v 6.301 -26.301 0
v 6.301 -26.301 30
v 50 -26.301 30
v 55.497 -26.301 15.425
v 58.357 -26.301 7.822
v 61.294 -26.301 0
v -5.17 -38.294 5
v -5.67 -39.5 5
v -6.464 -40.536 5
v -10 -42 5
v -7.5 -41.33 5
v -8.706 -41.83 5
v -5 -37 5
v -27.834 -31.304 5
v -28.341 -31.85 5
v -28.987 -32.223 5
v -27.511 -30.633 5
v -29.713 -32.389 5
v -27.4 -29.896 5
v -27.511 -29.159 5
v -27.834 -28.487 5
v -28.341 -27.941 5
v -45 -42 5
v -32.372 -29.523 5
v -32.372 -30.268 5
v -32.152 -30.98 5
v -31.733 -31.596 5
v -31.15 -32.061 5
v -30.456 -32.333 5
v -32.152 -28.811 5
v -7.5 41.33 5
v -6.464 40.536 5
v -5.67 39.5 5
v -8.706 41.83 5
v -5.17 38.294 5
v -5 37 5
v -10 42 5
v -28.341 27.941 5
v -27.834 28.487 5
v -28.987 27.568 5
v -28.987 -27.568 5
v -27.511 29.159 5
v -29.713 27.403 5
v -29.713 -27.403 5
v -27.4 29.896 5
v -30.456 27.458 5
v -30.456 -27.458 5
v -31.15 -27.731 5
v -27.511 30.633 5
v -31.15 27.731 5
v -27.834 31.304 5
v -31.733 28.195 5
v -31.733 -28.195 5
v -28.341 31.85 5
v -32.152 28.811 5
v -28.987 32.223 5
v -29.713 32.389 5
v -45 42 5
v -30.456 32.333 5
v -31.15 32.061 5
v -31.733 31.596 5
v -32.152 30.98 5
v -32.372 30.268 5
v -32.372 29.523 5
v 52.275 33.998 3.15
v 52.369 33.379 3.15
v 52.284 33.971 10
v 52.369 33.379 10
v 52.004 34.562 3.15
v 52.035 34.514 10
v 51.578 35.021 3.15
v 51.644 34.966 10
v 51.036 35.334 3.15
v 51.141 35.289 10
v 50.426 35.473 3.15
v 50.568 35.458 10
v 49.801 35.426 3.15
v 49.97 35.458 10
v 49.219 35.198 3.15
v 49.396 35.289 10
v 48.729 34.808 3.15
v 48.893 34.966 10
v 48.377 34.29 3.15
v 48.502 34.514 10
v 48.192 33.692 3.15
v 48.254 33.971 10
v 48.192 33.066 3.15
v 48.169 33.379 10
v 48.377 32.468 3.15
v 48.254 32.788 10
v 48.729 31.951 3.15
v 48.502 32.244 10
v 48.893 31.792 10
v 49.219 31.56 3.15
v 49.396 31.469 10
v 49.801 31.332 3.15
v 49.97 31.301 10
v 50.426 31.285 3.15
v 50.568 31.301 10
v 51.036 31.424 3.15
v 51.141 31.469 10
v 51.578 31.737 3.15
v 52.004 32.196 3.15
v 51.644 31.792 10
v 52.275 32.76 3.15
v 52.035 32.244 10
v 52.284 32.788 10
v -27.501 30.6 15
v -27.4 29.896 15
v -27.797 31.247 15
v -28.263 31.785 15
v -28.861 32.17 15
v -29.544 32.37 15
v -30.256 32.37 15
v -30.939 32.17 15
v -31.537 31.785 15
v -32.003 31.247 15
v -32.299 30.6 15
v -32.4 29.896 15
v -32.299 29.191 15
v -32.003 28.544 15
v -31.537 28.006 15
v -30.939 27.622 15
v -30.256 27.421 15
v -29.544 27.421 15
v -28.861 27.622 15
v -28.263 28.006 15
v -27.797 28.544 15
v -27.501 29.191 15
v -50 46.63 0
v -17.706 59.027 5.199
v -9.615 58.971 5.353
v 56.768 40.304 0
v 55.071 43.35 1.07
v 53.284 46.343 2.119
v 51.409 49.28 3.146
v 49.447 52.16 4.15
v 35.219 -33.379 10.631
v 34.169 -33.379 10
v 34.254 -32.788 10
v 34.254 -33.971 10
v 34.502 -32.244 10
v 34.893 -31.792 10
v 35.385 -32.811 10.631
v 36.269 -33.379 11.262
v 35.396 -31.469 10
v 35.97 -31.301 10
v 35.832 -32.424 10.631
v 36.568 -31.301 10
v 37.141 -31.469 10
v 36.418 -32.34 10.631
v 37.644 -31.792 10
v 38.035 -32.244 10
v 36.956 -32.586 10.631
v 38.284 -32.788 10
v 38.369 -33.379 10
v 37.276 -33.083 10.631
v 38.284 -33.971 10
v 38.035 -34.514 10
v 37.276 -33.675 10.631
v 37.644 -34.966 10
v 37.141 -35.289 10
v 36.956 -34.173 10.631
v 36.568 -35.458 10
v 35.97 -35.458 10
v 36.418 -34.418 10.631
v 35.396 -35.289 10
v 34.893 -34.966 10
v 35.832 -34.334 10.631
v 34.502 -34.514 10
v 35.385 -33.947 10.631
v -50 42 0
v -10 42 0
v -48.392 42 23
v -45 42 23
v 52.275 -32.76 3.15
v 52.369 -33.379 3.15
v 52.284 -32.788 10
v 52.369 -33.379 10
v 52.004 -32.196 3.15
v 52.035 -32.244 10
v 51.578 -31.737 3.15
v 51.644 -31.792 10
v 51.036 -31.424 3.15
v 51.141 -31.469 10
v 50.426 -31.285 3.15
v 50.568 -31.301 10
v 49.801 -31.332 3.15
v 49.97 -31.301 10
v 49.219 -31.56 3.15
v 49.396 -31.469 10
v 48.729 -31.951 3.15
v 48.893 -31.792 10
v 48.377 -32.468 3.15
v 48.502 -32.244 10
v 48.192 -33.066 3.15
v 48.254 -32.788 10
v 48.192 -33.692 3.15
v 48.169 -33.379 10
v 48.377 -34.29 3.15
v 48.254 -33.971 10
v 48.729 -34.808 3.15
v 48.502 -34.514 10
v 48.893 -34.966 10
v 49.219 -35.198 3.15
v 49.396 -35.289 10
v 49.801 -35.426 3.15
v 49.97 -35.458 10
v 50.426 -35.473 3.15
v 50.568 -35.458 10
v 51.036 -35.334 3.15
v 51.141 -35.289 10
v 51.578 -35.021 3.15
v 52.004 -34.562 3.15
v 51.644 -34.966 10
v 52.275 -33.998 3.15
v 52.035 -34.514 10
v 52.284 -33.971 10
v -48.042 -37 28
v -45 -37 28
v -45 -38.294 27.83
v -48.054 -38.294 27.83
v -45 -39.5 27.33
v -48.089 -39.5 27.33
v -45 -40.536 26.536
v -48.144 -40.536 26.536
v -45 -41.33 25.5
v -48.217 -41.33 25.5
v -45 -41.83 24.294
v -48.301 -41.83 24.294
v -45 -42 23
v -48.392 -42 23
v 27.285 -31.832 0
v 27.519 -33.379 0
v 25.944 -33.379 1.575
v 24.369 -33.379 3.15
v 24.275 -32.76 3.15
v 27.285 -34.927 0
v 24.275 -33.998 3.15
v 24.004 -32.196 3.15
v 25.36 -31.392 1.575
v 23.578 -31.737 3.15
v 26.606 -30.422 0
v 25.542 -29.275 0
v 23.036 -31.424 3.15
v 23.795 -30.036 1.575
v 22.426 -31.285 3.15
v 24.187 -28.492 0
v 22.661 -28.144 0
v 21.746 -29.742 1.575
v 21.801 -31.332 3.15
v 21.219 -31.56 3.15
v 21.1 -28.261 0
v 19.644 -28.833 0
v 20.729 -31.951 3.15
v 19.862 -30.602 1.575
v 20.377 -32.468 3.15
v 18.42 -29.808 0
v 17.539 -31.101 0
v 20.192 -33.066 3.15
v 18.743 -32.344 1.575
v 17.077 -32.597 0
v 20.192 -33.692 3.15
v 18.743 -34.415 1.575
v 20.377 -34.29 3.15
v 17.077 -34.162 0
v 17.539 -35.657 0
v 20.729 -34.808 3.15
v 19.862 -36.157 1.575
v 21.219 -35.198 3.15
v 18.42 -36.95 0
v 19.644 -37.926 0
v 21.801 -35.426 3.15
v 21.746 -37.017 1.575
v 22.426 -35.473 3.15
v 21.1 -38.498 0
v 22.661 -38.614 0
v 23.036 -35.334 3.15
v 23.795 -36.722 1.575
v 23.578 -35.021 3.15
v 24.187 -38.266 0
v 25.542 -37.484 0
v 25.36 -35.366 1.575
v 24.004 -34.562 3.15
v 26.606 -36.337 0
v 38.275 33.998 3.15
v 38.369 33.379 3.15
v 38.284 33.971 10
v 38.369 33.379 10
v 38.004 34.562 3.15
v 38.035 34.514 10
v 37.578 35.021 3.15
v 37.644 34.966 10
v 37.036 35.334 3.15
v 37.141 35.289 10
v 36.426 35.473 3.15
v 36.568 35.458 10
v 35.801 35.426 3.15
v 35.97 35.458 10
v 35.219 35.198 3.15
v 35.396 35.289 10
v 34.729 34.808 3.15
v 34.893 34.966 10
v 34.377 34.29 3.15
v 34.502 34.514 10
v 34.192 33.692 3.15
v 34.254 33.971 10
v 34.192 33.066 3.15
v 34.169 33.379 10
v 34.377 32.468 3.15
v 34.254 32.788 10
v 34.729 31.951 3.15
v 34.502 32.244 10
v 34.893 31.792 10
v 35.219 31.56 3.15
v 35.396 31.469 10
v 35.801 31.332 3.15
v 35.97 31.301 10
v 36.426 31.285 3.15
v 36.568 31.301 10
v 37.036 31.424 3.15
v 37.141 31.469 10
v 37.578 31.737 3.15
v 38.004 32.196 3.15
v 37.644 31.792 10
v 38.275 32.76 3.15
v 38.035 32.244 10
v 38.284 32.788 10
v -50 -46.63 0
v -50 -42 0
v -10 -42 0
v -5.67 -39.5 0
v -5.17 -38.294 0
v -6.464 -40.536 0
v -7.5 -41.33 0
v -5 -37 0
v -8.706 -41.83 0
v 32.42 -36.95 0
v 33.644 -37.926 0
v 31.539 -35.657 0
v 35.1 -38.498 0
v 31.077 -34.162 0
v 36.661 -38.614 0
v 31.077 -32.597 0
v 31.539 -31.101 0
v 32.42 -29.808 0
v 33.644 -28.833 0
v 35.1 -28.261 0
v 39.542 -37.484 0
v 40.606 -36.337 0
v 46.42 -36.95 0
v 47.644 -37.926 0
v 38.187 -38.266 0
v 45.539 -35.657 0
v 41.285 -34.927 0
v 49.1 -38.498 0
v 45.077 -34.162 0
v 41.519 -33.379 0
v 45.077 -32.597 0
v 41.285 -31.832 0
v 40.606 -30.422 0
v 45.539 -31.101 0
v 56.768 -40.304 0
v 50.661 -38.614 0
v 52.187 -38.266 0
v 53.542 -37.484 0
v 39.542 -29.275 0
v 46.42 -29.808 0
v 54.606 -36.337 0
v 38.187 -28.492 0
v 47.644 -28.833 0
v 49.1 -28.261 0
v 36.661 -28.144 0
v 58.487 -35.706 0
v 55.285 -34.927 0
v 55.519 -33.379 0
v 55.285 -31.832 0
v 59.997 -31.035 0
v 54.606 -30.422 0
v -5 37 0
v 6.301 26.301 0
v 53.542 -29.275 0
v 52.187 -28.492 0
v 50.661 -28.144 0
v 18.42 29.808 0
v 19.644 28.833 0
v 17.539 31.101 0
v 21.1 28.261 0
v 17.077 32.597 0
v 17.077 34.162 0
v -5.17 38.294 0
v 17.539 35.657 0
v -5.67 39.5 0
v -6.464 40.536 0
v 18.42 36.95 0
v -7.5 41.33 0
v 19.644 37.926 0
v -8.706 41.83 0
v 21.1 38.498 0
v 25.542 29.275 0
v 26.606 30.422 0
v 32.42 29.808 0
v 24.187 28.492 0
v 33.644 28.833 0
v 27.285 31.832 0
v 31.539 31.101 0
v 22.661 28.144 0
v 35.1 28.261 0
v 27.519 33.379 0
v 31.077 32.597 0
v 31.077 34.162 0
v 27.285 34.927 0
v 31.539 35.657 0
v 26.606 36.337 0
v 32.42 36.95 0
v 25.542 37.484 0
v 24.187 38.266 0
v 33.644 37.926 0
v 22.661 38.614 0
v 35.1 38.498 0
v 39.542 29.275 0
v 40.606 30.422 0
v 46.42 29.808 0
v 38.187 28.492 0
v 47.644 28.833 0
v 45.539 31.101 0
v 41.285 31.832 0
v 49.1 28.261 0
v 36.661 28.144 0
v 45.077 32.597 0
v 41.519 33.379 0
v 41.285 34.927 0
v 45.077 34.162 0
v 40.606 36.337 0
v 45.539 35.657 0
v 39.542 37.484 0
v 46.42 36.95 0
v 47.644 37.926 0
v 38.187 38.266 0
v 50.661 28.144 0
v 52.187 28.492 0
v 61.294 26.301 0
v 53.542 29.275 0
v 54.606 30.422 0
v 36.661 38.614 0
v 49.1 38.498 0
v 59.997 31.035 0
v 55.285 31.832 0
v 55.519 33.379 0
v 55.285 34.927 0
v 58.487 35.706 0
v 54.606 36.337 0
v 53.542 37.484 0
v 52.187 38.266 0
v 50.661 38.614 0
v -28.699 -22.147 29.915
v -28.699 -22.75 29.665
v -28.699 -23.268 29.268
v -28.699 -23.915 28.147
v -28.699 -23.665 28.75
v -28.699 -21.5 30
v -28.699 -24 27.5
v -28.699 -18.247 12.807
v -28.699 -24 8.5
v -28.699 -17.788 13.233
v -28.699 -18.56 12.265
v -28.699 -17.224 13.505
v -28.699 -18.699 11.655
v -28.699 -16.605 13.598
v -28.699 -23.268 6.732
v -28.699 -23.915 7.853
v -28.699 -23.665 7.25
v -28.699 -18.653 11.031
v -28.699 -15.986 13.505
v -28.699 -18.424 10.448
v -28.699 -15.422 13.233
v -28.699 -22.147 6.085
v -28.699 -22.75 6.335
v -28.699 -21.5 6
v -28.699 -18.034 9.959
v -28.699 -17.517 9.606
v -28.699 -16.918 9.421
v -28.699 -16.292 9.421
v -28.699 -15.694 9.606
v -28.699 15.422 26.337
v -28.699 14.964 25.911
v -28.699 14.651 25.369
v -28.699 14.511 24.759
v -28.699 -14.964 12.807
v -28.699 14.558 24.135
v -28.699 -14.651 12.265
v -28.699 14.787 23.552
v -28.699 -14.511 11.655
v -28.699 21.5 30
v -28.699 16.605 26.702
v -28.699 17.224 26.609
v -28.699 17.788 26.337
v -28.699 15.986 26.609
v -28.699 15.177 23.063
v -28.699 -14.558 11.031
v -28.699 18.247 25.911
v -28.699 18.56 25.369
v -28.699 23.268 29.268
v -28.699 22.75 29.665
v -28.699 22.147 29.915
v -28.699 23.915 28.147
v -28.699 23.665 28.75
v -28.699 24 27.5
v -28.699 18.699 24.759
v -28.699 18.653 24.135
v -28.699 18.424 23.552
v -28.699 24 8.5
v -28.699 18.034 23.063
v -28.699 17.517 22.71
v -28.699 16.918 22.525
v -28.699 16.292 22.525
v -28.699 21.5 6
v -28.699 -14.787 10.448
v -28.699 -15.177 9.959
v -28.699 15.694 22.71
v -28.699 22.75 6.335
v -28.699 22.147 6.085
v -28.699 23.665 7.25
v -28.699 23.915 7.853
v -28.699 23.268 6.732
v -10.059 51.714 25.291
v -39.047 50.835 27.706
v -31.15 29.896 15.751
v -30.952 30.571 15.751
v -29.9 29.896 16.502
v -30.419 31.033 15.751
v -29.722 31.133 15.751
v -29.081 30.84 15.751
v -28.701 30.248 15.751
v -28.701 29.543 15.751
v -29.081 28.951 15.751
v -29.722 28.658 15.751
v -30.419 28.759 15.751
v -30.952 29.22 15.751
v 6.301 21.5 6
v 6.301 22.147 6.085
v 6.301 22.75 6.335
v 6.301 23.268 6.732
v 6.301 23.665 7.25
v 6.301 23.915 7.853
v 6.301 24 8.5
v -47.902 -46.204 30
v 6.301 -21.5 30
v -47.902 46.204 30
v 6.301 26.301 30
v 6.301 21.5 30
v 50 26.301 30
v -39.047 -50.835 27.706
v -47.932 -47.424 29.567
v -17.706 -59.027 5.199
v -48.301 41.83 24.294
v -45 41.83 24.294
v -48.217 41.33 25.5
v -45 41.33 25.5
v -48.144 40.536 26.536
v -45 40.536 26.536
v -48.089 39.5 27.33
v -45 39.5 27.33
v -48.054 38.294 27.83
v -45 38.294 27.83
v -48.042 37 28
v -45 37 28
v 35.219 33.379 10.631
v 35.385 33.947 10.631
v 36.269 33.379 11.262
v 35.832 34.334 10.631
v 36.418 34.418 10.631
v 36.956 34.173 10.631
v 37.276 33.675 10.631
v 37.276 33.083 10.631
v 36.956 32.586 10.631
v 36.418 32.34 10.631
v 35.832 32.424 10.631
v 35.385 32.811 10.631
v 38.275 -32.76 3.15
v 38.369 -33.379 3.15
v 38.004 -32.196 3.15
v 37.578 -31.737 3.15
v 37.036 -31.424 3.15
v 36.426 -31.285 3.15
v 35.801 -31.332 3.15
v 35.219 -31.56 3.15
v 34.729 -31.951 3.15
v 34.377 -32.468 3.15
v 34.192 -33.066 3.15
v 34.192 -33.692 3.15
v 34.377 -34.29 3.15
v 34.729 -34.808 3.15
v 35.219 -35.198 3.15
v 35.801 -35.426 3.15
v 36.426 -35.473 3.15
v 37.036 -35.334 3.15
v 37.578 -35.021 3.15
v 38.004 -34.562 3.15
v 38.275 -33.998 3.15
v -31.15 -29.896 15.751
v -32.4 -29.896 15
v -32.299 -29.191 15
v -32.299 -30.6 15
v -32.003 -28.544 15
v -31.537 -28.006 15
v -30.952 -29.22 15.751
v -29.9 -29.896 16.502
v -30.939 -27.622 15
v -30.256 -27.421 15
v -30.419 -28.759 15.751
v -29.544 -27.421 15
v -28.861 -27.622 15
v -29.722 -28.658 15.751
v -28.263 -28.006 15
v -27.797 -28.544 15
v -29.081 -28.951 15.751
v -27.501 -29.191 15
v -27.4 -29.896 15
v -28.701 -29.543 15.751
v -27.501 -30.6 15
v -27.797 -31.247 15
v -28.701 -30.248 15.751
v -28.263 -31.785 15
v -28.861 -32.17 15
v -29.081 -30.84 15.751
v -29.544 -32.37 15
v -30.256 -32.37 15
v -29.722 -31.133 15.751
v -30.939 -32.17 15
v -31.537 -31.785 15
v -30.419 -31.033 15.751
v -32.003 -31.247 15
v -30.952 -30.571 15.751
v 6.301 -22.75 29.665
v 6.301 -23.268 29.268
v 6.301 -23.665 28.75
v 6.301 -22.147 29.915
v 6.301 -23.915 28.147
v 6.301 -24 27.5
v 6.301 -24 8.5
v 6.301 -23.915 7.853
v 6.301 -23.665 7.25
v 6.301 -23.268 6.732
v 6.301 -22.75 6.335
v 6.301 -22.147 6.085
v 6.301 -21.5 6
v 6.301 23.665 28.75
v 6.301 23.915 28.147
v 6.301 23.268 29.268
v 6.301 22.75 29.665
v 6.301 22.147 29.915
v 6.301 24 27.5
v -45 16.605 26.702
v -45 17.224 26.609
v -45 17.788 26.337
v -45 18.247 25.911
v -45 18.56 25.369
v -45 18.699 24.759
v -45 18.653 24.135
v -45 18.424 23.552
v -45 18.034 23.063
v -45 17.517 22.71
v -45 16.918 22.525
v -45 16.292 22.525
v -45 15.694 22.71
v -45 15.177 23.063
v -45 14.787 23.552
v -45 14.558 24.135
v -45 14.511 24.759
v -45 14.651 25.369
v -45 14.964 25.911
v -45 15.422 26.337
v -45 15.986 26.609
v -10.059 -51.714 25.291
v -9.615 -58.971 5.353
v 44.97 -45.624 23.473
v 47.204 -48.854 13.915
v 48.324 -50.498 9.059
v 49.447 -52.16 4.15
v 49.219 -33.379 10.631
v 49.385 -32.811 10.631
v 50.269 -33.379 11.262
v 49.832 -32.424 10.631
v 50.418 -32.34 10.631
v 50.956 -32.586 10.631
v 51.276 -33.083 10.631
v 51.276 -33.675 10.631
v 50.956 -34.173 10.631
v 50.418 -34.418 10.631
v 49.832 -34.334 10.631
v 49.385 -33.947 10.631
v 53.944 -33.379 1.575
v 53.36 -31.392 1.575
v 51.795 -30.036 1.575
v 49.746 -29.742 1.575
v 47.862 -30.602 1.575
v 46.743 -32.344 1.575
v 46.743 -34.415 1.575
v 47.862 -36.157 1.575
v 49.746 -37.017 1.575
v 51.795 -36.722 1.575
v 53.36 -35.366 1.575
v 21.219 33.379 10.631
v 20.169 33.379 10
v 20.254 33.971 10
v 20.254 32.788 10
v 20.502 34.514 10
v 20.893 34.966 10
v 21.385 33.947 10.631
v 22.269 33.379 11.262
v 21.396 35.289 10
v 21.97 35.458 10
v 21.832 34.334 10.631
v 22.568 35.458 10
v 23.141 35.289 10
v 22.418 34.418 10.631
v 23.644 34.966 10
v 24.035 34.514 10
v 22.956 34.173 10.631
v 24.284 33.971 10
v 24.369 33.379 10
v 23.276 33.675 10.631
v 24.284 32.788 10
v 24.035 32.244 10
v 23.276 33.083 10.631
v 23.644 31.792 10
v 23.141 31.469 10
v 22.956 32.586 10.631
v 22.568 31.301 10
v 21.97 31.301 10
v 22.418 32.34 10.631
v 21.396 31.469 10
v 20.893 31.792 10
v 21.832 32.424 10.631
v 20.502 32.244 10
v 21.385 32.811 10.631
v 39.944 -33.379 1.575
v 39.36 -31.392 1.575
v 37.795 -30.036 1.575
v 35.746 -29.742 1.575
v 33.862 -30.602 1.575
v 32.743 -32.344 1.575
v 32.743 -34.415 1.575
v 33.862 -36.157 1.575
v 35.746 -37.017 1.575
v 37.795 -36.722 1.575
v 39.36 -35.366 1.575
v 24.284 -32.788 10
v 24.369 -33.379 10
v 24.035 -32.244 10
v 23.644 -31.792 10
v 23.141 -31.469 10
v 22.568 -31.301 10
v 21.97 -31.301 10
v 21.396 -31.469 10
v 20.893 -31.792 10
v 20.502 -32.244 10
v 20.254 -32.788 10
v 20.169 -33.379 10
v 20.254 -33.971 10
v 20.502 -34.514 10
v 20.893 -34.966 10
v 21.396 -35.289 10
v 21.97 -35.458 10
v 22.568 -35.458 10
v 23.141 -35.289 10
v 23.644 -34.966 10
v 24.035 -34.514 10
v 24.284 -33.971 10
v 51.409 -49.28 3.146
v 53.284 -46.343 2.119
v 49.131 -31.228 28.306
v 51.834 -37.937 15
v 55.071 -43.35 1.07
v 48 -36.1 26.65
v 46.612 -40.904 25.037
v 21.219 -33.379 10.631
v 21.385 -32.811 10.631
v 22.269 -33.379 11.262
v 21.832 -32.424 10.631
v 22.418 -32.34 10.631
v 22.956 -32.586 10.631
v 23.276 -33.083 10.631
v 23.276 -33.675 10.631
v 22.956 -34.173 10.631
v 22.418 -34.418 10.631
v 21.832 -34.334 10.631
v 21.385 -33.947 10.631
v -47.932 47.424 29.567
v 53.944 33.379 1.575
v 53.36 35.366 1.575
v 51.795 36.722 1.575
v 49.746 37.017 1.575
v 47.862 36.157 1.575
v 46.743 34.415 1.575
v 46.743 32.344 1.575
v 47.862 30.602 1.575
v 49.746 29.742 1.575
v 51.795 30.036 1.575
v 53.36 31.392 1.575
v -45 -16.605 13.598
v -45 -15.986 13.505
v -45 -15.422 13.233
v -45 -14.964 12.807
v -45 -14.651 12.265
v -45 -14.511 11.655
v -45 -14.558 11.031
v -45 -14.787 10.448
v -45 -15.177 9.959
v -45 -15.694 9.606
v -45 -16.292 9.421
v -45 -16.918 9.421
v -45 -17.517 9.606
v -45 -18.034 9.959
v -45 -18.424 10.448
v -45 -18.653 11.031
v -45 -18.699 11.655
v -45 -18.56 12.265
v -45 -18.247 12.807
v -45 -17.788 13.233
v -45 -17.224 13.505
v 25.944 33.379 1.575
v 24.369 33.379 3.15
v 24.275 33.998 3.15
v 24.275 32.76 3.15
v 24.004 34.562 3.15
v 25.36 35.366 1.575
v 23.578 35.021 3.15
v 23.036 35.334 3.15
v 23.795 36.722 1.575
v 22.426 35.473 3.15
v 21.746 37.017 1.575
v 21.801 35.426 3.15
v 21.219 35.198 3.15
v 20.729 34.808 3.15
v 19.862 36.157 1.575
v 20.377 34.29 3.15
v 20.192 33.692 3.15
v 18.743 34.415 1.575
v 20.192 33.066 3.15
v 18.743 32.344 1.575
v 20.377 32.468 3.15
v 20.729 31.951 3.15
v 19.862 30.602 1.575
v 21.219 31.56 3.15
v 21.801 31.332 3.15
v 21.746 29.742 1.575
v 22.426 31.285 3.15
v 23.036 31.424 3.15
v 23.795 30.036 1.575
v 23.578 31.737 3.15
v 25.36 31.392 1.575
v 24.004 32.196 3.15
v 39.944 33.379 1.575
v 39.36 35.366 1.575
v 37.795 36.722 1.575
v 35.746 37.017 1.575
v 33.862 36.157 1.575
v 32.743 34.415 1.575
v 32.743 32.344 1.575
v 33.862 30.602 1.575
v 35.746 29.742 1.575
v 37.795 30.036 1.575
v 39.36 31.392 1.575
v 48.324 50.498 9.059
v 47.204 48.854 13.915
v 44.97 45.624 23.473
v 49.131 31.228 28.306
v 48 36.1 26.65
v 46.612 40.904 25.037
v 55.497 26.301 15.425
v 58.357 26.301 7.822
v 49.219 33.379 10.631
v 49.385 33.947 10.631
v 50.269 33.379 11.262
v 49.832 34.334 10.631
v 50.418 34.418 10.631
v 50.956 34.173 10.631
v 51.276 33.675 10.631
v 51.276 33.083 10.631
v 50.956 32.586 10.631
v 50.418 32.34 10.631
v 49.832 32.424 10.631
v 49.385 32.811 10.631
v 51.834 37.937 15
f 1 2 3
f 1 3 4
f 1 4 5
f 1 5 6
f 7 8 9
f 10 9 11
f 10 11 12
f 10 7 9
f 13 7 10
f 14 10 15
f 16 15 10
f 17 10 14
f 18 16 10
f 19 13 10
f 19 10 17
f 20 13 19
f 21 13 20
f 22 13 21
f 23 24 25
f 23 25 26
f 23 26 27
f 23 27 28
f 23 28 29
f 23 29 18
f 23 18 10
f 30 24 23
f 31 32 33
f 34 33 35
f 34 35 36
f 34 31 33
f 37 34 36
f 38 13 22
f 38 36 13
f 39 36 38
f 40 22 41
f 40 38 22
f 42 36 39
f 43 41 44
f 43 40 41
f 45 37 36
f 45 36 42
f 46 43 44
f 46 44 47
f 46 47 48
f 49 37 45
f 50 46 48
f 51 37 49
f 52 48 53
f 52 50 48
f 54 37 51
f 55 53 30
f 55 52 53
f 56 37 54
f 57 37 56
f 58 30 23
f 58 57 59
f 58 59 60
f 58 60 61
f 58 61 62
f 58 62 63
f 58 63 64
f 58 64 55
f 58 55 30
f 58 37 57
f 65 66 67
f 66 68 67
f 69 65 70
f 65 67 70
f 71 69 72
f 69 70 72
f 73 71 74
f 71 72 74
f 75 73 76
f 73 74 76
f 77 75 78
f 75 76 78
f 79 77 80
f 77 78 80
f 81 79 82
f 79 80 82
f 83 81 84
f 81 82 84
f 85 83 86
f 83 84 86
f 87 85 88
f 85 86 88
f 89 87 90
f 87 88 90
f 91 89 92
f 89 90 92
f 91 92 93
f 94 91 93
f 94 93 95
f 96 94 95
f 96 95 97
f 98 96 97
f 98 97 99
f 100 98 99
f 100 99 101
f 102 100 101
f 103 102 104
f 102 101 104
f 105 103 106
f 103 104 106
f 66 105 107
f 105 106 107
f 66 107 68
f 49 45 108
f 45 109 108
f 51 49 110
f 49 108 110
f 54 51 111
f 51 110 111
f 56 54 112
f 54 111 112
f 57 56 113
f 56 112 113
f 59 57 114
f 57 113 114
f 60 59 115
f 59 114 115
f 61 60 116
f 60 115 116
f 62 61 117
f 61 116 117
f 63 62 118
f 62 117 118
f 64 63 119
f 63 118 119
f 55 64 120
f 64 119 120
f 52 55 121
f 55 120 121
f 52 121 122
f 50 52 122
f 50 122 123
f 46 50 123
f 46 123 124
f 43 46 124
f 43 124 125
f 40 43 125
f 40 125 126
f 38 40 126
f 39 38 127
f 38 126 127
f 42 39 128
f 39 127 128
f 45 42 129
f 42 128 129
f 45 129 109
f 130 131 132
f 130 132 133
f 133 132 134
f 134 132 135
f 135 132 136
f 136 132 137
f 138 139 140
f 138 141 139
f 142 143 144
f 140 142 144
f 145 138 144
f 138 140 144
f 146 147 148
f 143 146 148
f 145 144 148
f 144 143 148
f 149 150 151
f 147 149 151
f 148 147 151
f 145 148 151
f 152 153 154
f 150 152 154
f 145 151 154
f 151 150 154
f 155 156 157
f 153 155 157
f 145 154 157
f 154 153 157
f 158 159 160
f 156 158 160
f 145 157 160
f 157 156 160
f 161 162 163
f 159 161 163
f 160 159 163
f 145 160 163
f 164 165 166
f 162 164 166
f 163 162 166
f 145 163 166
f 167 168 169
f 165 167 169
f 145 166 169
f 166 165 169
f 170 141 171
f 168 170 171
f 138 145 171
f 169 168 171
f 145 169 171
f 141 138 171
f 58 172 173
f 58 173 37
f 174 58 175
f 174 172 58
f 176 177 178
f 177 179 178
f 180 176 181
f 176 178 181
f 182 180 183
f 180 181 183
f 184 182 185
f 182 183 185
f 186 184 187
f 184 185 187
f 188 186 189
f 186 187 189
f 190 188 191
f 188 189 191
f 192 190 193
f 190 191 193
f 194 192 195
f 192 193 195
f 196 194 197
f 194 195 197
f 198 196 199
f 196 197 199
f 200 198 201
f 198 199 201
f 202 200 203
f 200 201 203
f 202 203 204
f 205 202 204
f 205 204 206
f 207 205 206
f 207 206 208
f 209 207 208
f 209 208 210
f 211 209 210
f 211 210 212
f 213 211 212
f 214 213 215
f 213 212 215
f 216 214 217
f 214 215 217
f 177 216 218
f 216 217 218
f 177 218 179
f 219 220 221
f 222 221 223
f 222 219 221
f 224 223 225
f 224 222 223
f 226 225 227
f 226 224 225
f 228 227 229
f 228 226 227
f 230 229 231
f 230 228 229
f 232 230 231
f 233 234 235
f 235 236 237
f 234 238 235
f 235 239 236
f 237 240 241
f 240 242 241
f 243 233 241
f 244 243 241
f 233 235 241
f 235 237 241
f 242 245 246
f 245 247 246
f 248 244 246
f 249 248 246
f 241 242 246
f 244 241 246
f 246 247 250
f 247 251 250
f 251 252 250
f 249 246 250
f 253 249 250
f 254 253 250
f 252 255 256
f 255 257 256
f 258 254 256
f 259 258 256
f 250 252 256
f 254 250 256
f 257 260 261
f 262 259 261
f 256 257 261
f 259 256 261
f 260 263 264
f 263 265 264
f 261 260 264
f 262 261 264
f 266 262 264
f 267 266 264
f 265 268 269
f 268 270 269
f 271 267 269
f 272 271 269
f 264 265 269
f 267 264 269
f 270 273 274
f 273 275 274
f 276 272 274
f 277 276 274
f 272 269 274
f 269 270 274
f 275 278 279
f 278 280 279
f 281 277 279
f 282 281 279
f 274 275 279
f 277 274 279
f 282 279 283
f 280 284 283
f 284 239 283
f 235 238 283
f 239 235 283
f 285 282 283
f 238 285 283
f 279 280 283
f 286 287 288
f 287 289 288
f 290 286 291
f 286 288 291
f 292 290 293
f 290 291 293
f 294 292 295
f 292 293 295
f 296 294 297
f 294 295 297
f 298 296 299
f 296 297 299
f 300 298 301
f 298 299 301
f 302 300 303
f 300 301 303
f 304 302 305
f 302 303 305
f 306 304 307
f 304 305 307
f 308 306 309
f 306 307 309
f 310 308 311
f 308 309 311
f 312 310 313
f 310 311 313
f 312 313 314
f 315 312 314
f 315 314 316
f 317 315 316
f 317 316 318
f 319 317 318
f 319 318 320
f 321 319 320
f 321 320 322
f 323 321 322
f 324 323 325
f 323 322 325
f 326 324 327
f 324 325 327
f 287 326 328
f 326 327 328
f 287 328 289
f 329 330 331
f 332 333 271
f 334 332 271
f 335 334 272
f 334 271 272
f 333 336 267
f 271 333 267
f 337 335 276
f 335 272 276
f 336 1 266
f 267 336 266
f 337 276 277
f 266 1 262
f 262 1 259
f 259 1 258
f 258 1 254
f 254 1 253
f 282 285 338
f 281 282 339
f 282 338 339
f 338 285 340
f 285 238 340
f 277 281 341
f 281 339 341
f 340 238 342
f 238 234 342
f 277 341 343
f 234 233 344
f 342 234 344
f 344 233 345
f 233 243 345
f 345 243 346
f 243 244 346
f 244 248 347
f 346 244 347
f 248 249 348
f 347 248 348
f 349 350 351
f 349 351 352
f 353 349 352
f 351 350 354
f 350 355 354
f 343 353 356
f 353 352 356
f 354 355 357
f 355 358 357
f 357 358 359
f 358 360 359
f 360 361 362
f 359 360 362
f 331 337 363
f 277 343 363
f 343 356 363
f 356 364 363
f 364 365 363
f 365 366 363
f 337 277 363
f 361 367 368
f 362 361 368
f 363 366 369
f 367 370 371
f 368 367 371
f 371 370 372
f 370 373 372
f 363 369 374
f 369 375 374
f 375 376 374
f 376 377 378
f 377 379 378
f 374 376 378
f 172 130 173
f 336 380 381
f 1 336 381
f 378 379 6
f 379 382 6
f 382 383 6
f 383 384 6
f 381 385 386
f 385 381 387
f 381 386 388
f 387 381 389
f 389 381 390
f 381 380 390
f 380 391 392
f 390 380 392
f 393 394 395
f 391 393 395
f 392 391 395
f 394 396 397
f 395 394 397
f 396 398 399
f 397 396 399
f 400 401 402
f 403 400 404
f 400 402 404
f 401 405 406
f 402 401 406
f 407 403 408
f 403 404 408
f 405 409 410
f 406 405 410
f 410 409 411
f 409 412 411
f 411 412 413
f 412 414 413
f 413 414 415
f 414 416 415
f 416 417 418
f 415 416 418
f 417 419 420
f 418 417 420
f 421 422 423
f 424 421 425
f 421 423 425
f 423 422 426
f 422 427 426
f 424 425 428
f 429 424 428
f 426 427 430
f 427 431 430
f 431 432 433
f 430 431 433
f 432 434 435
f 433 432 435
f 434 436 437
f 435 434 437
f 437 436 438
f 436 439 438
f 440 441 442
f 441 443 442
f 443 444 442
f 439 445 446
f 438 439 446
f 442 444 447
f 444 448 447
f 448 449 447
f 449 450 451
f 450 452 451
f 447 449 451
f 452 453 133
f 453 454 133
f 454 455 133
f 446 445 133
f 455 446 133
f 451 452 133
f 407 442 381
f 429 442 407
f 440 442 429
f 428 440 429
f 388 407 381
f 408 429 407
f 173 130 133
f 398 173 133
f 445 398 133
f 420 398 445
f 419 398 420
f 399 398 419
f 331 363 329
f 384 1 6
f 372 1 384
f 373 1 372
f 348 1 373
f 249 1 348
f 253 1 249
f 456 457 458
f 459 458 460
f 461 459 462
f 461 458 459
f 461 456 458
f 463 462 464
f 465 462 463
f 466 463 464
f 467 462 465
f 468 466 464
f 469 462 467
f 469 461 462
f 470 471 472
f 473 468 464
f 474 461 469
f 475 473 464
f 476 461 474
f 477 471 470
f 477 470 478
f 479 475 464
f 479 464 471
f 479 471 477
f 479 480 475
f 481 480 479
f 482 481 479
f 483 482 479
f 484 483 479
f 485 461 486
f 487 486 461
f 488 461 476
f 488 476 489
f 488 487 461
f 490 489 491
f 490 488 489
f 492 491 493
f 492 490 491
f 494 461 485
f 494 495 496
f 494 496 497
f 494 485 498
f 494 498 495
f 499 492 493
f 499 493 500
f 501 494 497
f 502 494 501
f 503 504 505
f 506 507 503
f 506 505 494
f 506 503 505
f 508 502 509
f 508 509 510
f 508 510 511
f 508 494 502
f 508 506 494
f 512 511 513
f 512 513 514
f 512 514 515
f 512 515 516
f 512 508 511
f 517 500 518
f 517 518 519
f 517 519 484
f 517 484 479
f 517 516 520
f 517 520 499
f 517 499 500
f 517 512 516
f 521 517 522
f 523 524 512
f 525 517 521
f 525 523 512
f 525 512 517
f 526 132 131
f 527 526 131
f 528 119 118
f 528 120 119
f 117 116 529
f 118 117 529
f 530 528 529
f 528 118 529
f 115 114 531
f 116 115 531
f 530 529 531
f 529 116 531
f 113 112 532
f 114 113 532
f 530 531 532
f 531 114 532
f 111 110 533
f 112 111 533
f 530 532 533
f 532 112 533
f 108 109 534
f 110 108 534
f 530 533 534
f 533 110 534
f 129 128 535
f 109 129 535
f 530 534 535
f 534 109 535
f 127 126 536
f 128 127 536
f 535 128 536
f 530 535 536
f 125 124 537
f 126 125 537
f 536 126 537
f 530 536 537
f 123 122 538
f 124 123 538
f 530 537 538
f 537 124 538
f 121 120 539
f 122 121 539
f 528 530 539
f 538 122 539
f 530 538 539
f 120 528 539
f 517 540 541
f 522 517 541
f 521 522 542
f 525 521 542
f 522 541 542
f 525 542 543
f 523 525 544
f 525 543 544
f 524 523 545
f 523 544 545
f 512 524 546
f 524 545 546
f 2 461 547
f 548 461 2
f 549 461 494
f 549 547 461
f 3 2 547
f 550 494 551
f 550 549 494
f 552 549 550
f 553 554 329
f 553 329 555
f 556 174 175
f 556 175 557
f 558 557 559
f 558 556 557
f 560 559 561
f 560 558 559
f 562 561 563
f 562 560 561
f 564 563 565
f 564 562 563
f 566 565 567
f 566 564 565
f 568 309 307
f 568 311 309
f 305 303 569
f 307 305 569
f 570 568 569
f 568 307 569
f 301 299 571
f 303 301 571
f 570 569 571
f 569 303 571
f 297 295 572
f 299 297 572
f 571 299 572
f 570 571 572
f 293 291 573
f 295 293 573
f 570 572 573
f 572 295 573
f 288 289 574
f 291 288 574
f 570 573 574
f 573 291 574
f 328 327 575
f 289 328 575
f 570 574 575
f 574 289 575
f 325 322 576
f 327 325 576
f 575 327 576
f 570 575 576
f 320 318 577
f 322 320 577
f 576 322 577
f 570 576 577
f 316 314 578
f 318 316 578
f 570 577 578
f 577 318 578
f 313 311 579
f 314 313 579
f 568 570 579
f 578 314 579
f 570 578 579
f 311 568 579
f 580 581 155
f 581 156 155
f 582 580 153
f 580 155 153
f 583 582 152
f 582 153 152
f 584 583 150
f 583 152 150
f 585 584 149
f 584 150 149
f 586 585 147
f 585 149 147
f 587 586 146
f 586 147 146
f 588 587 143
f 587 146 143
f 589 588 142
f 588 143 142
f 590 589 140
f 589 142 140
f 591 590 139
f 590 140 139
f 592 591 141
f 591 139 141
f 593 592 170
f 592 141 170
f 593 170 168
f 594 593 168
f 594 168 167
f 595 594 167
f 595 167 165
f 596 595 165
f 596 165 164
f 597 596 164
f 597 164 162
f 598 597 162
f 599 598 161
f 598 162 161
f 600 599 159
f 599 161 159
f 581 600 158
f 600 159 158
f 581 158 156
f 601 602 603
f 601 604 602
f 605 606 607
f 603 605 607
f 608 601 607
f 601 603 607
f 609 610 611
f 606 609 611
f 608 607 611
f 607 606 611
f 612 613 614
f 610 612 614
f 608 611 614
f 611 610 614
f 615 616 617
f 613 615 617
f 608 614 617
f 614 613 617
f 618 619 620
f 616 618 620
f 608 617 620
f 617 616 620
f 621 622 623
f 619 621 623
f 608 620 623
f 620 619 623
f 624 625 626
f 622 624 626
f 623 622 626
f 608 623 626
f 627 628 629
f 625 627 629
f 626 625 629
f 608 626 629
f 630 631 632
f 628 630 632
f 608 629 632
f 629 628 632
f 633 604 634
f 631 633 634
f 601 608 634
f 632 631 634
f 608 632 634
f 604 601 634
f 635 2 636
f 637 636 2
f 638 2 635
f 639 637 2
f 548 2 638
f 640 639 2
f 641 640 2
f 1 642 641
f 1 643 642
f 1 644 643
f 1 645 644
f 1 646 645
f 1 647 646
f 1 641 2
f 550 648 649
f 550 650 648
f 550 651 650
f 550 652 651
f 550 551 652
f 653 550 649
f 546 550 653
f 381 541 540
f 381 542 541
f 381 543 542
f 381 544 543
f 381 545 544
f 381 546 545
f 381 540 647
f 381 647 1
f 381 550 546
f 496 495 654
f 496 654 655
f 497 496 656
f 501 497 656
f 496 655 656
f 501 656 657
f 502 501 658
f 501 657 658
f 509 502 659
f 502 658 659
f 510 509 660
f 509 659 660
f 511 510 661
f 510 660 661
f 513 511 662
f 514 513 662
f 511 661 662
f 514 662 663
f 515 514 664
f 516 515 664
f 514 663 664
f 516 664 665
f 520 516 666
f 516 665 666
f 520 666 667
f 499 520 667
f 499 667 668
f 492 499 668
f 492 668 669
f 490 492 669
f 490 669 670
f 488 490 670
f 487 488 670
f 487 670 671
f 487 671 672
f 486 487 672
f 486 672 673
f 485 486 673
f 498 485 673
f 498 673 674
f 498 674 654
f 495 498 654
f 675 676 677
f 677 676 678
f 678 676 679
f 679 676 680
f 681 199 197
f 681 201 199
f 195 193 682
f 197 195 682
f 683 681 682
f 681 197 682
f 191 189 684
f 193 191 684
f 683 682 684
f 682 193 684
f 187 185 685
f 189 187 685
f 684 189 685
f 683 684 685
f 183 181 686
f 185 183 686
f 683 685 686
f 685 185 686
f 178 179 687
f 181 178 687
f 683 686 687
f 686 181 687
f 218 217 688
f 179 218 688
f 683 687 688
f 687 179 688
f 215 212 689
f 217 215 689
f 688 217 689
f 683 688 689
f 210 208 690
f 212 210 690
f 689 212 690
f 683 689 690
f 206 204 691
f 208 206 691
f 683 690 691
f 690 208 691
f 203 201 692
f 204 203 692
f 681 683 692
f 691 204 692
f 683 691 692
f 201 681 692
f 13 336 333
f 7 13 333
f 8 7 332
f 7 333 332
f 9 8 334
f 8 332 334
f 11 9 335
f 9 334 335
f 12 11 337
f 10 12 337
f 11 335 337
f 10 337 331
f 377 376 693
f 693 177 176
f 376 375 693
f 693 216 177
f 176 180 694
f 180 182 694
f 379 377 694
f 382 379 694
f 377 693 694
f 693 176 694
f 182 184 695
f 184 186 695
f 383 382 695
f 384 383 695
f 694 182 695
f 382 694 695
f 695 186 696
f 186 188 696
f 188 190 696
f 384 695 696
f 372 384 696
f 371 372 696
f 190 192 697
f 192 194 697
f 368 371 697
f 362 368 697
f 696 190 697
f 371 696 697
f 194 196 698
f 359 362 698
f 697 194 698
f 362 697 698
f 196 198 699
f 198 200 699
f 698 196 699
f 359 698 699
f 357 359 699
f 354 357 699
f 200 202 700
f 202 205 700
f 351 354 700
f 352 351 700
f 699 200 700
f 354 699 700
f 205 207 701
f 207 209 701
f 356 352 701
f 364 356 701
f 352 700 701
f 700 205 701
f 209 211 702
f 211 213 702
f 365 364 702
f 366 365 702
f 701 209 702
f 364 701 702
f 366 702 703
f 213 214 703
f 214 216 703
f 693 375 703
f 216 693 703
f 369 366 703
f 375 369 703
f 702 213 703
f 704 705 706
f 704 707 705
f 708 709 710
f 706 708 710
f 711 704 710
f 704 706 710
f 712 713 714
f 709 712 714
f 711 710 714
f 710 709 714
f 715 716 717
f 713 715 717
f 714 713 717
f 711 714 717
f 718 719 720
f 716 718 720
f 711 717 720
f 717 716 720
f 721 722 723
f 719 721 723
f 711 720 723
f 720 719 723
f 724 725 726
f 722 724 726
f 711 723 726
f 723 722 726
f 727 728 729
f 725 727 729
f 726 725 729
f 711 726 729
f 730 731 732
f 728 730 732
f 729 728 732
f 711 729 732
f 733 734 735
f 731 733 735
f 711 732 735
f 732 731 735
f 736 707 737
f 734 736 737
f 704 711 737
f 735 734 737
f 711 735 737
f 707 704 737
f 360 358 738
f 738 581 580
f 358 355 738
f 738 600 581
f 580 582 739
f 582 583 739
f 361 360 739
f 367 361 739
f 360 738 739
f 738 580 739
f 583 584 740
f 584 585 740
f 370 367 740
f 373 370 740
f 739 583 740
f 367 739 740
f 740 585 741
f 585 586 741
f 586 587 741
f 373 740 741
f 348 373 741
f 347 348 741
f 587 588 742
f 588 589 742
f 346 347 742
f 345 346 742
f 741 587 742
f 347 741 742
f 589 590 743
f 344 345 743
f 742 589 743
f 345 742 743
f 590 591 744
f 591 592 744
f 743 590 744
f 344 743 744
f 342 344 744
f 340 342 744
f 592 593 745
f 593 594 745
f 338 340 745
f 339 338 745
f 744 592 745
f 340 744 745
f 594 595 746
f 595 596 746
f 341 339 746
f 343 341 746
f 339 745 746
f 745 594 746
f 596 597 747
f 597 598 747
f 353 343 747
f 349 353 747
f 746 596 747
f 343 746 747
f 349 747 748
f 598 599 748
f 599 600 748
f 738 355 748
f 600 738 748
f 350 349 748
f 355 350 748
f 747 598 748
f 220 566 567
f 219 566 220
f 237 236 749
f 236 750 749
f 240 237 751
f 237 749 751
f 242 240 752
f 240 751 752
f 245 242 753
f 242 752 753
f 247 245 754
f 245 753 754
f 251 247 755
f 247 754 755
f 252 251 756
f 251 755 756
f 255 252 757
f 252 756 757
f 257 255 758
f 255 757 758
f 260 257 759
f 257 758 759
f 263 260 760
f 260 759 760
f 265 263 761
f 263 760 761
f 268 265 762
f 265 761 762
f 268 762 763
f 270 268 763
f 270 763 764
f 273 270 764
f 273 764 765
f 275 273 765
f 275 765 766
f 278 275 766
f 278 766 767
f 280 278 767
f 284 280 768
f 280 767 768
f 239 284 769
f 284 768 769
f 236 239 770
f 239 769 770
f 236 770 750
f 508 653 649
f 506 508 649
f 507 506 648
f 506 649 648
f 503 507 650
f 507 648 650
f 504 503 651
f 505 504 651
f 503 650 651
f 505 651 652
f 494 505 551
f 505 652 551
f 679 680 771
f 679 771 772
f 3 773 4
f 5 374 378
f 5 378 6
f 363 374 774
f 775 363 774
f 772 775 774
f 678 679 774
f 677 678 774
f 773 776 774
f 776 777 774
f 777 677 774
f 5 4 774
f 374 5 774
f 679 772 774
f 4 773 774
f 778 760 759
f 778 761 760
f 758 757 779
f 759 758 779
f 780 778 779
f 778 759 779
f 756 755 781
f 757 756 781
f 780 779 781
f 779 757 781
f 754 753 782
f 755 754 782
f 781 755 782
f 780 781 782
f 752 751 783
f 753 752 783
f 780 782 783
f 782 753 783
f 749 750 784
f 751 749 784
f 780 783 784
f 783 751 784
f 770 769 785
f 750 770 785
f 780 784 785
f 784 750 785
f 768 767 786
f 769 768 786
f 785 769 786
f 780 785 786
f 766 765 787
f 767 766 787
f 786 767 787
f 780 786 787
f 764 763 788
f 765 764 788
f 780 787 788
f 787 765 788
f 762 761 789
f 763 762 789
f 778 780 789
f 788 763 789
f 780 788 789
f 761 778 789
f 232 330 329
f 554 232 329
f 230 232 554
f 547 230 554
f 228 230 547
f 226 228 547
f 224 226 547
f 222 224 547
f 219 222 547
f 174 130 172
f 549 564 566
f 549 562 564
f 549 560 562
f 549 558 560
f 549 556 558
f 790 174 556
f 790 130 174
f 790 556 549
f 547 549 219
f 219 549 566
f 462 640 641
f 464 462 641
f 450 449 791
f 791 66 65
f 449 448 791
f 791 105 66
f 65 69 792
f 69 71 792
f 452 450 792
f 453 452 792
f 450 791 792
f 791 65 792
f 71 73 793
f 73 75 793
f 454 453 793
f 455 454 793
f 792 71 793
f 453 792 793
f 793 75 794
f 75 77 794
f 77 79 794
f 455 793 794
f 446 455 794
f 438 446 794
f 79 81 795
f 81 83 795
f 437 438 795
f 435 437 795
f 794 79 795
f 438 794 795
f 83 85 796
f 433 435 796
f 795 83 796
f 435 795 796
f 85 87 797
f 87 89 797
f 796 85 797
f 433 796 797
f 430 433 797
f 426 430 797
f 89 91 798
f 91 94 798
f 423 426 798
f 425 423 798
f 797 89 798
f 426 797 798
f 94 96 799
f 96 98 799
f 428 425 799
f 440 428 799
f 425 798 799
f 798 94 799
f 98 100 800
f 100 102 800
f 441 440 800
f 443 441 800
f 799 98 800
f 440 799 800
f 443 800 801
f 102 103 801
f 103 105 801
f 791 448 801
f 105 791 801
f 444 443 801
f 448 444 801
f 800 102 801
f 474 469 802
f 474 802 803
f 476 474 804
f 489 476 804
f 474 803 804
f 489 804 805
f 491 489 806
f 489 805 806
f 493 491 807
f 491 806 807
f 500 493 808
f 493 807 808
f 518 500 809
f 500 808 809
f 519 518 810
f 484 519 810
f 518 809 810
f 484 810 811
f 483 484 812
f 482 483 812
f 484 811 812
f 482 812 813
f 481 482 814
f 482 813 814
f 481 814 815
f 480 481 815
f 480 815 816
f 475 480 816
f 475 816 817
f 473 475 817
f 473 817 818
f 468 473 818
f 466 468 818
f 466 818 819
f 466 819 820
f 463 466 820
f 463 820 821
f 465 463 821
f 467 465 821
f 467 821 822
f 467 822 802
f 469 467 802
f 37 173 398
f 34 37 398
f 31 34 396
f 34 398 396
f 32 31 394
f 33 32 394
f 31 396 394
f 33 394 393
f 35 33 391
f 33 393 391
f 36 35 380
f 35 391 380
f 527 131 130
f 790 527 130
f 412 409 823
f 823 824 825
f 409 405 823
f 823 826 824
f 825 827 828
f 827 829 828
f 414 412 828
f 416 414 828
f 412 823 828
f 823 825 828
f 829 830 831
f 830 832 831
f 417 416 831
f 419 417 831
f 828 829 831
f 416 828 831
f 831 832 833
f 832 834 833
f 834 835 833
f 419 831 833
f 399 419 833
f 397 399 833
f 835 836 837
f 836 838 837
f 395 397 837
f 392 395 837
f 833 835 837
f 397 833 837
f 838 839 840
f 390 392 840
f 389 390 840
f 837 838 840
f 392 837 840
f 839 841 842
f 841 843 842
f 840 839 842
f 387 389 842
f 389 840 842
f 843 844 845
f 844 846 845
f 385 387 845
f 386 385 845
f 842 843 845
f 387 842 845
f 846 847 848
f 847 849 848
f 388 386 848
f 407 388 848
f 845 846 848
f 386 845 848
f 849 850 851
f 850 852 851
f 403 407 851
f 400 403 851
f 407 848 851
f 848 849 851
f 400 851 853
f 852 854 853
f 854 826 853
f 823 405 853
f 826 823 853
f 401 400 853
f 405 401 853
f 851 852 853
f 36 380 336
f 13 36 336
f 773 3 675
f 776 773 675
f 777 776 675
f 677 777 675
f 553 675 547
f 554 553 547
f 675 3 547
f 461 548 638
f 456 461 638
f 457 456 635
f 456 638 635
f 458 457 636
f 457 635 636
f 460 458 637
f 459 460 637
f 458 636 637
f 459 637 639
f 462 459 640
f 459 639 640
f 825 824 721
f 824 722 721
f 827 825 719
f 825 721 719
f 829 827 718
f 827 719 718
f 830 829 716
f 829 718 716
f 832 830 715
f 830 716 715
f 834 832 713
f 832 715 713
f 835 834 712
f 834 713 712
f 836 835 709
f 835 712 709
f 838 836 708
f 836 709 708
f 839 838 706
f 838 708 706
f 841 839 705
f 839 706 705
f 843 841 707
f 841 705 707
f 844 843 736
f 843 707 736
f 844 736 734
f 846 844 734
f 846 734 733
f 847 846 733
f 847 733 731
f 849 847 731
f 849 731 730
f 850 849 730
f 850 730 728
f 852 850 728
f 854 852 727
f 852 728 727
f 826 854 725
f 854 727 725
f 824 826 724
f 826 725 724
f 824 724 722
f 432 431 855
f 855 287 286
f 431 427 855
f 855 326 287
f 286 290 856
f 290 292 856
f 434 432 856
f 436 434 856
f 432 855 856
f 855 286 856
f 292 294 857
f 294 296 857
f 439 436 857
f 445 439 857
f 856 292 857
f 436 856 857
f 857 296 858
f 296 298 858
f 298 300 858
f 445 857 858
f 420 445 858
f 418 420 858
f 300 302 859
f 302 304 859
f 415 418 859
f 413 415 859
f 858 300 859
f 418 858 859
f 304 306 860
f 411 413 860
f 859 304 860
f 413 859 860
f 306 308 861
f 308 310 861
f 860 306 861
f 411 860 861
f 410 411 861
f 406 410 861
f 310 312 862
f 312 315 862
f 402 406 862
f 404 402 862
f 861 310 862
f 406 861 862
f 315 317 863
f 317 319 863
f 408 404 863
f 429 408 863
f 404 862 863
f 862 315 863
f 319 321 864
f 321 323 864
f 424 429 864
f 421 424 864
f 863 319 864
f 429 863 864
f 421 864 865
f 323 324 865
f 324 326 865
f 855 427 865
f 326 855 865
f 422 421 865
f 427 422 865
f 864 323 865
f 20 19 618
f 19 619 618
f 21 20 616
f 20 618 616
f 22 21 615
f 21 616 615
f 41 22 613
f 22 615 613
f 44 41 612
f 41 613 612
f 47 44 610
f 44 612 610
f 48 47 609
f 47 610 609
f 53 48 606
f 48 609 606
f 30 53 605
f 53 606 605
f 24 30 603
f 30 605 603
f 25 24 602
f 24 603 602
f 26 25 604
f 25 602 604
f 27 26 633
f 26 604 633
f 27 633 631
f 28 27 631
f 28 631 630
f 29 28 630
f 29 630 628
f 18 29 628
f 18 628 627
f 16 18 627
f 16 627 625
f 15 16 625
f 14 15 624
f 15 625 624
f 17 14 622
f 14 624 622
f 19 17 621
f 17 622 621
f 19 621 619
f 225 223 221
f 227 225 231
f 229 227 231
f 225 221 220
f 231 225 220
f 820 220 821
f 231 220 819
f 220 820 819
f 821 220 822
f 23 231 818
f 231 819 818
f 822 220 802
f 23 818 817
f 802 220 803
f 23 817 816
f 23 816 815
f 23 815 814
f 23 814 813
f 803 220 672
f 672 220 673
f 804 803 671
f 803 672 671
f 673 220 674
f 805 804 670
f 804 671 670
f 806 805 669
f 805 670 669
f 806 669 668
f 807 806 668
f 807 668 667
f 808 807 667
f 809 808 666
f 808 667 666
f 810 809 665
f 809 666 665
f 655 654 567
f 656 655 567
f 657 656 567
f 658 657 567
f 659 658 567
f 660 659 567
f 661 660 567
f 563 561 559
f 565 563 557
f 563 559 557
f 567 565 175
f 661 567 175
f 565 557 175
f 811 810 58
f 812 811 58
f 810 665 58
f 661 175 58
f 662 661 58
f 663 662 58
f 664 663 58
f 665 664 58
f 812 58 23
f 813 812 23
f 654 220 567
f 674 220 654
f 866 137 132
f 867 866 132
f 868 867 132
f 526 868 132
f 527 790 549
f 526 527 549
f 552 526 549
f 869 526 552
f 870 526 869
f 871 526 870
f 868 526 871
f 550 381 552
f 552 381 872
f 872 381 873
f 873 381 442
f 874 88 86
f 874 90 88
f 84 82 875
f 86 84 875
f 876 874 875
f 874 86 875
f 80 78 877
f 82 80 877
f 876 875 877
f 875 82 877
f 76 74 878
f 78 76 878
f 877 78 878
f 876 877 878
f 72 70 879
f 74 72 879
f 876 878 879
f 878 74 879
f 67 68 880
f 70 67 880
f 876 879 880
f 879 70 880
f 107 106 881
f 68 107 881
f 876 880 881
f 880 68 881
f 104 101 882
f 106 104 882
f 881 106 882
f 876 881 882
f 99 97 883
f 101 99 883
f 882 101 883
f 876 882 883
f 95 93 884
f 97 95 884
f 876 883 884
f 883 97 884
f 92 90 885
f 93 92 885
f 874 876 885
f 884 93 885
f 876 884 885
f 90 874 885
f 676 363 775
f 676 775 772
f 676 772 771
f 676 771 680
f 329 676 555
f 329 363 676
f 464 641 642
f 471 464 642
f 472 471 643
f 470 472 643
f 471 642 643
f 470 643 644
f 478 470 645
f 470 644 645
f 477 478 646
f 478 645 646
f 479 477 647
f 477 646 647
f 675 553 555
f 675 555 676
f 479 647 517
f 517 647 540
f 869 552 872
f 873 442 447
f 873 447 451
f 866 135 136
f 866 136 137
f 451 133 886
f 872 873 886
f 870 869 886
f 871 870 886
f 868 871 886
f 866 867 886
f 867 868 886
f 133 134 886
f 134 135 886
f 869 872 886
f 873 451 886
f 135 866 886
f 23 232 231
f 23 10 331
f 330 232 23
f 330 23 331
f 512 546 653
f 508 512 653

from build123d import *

# Parameters (mm, degrees)
BOSS_EXTRUDE1_DEPTH             = 30
SKETCH3_W                       = 30
SKETCH3_H                       = 52.601373674
CUT_EXTRUDE1_DEPTH              = 20
DRAFT1_ANGLE                    = 20
CUT_EXTRUDE2_DEPTH              = 5
CUT_EXTRUDE3_DEPTH              = 5
M6X1_0_TAPPED_HOLE1_D           = 5
M6X1_0_TAPPED_HOLE1_DEPTH       = 10
M6X1_0_TAPPED_HOLE1_TIP         = 1.502151548
CUT_REVOLVE1_ANGLE              = 20
CUT_REVOLVE2_ANGLE              = 20
CUT_REVOLVE3_ANGLE              = 20
CUT_REVOLVE4_ANGLE              = 20
CUT_EXTRUDE4_DEPTH              = 35
M5X0_8_TAPPED_HOLE1_D           = 4.2
SKETCH19_W                      = 47.516094142
SKETCH19_H                      = 117.781056104
CUT_REVOLVE5_ANGLE              = 4
M5X0_8_TAPPED_HOLE2_D           = 4.2
M5X0_8_TAPPED_HOLE2_DEPTH       = 10
M5X0_8_TAPPED_HOLE2_CSINK_D     = 10.5
M5X0_8_TAPPED_HOLE2_CSINK_ANGLE = 90
M5X0_8_TAPPED_HOLE2_TIP         = 1.2618073


with BuildPart() as part:
    # Sketch2 → Boss-Extrude1 (new body)
    with BuildSketch(Plane.XY):
        with BuildLine():
            Line((-41.221662469, 50), (-50, 46.630311934))
            Line((-50, 46.630311934), (-50, -46.630311934))
            Line((-50, -46.630311934), (-41.221662469, -50))
            Line((-41.221662469, -50), (-10.163742616, -50))
            Line((-10.163742616, -50), (43.420662363, -43.420662363))
            ThreePointArc((43.420662363, -43.420662363), (47.113322701, -35.015547326), (50, -26.300686837))
            Line((50, -26.300686837), (26.300686837, -26.300686837))
            Line((26.300686837, -26.300686837), (26.300686837, 26.300686837))
            Line((26.300686837, 26.300686837), (50, 26.300686837))
            ThreePointArc((50, 26.300686837), (47.113322701, 35.015547326), (43.420662363, 43.420662363))
            Line((43.420662363, 43.420662363), (-10.163742616, 50))
            Line((-10.163742616, 50), (-41.221662469, 50))
        make_face()
    extrude(amount=BOSS_EXTRUDE1_DEPTH)

    # Sketch3 → Cut-Extrude1 (cut)
    with BuildSketch(Plane(origin=(26.300686837, 0, 0), x_dir=(0, 0, -1), z_dir=(1, 0, 0))):
        with Locations((-15, 0)):
            Rectangle(SKETCH3_W, SKETCH3_H)
    extrude(amount=-CUT_EXTRUDE1_DEPTH, mode=Mode.SUBTRACT)

    # Draft1
    draft1_faces = [part.faces().sort_by_distance(p)[0] for p in [
        (-25.692702542, 50, 15),
        (16.628459874, 46.710331182, 15),
        (47.113322701, 35.015547326, 15),
        (47.113322701, -35.015547326, 15),
        (-25.692702542, -50, 15),
        (16.628459874, -46.710331182, 15),
    ]]
    draft(draft1_faces, Plane.XY.offset(30), DRAFT1_ANGLE)

    # Sketch5 → Cut-Extrude2 (cut)
    with BuildSketch(Plane.ZY.offset(50)):
        with BuildLine():
            Line((0, 42), (23, 42))
            ThreePointArc((23, 42), (26.535533906, 40.535533906), (28, 37))
            Line((28, 37), (28, -37))
            ThreePointArc((28, -37), (26.535533906, -40.535533906), (23, -42))
            Line((23, -42), (0, -42))
            Line((0, -42), (0, 42))
        make_face()
    extrude(amount=-CUT_EXTRUDE2_DEPTH, mode=Mode.SUBTRACT)

    # Sketch6 → Cut-Extrude3 (cut)
    with BuildSketch(Plane(origin=(0, 0, 0), x_dir=(-1, 0, 0), z_dir=(0, 0, -1))):
        with BuildLine():
            Line((45, 42), (10, 42))
            ThreePointArc((10, 42), (6.464466094, 40.535533906), (5, 37))
            Line((5, 37), (5, -37))
            ThreePointArc((5, -37), (6.464466094, -40.535533906), (10, -42))
            Line((10, -42), (45, -42))
            Line((45, -42), (45, 42))
        make_face()
    extrude(amount=-CUT_EXTRUDE3_DEPTH, mode=Mode.SUBTRACT)

    # M6x1.0 Tapped Hole1
    with Locations(Plane(origin=(0, 0, 5), x_dir=(-1, 0, 0), z_dir=(0, 0, -1))):
        with Locations((29.9, 29.895651858), (29.9, -29.895651858)):
            Hole(M6X1_0_TAPPED_HOLE1_D / 2, depth=M6X1_0_TAPPED_HOLE1_DEPTH)
            with Locations((0, 0, -(M6X1_0_TAPPED_HOLE1_DEPTH + M6X1_0_TAPPED_HOLE1_TIP / 2))):  # 118° drill point
                Cone(0, M6X1_0_TAPPED_HOLE1_D / 2, M6X1_0_TAPPED_HOLE1_TIP, mode=Mode.SUBTRACT)

    # Sketch9 → Cut-Revolve1 (revolve, cut)
    with BuildSketch(Plane(origin=(0, 0, 0), x_dir=(-1, 0, 0), z_dir=(0, 0, -1))):
        with BuildLine():
            Line((50, 46.630311934), (-56.76790933, 40.30398391))
            ThreePointArc((-56.76790933, 40.30398391), (-54.419330105, 48.540812289), (-51.472316128, 56.582968389))
            Line((-51.472316128, 56.582968389), (18.167108014, 64.912852718))
            Line((18.167108014, 64.912852718), (50, 46.630311934))
        make_face()
    revolve(axis=Axis((-50, 46.630311934, 0), (0.9982491449473906, -0.0591493416007627, 0)), revolution_arc=CUT_REVOLVE1_ANGLE, mode=Mode.SUBTRACT)

    # Sketch11 → Cut-Revolve2 (revolve, cut)
    with BuildSketch(Plane(origin=(0, 0, 0), x_dir=(-1, 0, 0), z_dir=(0, 0, -1))):
        with BuildLine():
            Line((50, -46.630311934), (-56.76790933, -40.30398391))
            ThreePointArc((-56.76790933, -40.30398391), (-55.407295575, -48.597993011), (-53.453959647, -56.772730652))
            Line((-53.453959647, -56.772730652), (21.223580117, -65.428953237))
            Line((21.223580117, -65.428953237), (50, -46.630311934))
        make_face()
    revolve(axis=Axis((-50, -46.630311934, 0), (-0.9982491449473906, -0.05914934160076277, 0)), revolution_arc=CUT_REVOLVE2_ANGLE, mode=Mode.SUBTRACT)

    # Sketch13 → Cut-Revolve3 (revolve, cut)
    with BuildSketch(Plane.XY.offset(30)):
        Polygon((-50, 46.630311934), (50, 26.300686837), (49.446951964, 52.159989852), (-50, 58.994858097), align=None)
    revolve(axis=Axis((-50, 46.630311934, 30), (-0.9799545689980745, 0.1992210899975155, 0)), revolution_arc=CUT_REVOLVE3_ANGLE, mode=Mode.SUBTRACT)

    # Sketch14 → Cut-Revolve4 (revolve, cut)
    with BuildSketch(Plane.XY.offset(30)):
        Polygon((50, -26.300686837), (49.446951964, -52.159989852), (-50, -58.995311934), (-50, -46.630311934), align=None)
    revolve(axis=Axis((50, -26.300686837, 30), (0.9799545689980745, 0.1992210899975155, 0)), revolution_arc=CUT_REVOLVE4_ANGLE, mode=Mode.SUBTRACT)

    # Sketch15 → Cut-Extrude4 (cut)
    with BuildSketch(Plane(origin=(6.300686837, 0, 0), x_dir=(0, 0, -1), z_dir=(1, 0, 0))):
        with BuildLine():
            Line((-30, 0), (-30, -21.5))
            ThreePointArc((-30, -21.5), (-29.267766953, -23.267766953), (-27.5, -24))
            Line((-27.5, -24), (-8.5, -24))
            ThreePointArc((-8.5, -24), (-6.732233047, -23.267766953), (-6, -21.5))
            Line((-6, -21.5), (-6, 21.5))
            ThreePointArc((-6, 21.5), (-6.732233047, 23.267766953), (-8.5, 24))
            Line((-8.5, 24), (-27.5, 24))
            ThreePointArc((-27.5, 24), (-29.267766953, 23.267766953), (-30, 21.5))
            Line((-30, 21.5), (-30, 0))
        make_face()
    extrude(amount=-CUT_EXTRUDE4_DEPTH, mode=Mode.SUBTRACT)

    # M5x0.8 Tapped Hole1 (through all)
    with Locations(Plane(origin=(-28.699313163, 0, 0), x_dir=(0, 0, -1), z_dir=(1, 0, 0))):
        with Locations((-11.497988924, -16.605361405), (-24.602011076, 16.605361405)):
            Hole(M5X0_8_TAPPED_HOLE1_D / 2)

    # Sketch19 → Cut-Revolve5 (revolve, cut)
    with BuildSketch(Plane.ZY.offset(50)):
        with Locations((23.758047071, 0)):
            Rectangle(SKETCH19_W, SKETCH19_H)
    revolve(axis=Axis((-50, 58.890528052, 0), (0, 1, 0)), revolution_arc=CUT_REVOLVE5_ANGLE, mode=Mode.SUBTRACT)

    # M5x0.8 Tapped Hole2
    with Locations(Plane(origin=(0, 0, 0), x_dir=(-1, 0, 0), z_dir=(0, 0, -1))):
        with Locations((-50.268656574, 33.379143774), (-50.268656574, -33.379143774), (-36.268656574, -33.379143774), (-22.268656574, -33.379143774), (-36.268656574, 33.379143774), (-22.268656574, 33.379143774)):
            CounterSinkHole(M5X0_8_TAPPED_HOLE2_D / 2, M5X0_8_TAPPED_HOLE2_CSINK_D / 2, depth=M5X0_8_TAPPED_HOLE2_DEPTH, counter_sink_angle=M5X0_8_TAPPED_HOLE2_CSINK_ANGLE)
            with Locations((0, 0, -(M5X0_8_TAPPED_HOLE2_DEPTH + M5X0_8_TAPPED_HOLE2_TIP / 2))):  # 118° drill point
                Cone(0, M5X0_8_TAPPED_HOLE2_D / 2, M5X0_8_TAPPED_HOLE2_TIP, mode=Mode.SUBTRACT)


solid = part.part
